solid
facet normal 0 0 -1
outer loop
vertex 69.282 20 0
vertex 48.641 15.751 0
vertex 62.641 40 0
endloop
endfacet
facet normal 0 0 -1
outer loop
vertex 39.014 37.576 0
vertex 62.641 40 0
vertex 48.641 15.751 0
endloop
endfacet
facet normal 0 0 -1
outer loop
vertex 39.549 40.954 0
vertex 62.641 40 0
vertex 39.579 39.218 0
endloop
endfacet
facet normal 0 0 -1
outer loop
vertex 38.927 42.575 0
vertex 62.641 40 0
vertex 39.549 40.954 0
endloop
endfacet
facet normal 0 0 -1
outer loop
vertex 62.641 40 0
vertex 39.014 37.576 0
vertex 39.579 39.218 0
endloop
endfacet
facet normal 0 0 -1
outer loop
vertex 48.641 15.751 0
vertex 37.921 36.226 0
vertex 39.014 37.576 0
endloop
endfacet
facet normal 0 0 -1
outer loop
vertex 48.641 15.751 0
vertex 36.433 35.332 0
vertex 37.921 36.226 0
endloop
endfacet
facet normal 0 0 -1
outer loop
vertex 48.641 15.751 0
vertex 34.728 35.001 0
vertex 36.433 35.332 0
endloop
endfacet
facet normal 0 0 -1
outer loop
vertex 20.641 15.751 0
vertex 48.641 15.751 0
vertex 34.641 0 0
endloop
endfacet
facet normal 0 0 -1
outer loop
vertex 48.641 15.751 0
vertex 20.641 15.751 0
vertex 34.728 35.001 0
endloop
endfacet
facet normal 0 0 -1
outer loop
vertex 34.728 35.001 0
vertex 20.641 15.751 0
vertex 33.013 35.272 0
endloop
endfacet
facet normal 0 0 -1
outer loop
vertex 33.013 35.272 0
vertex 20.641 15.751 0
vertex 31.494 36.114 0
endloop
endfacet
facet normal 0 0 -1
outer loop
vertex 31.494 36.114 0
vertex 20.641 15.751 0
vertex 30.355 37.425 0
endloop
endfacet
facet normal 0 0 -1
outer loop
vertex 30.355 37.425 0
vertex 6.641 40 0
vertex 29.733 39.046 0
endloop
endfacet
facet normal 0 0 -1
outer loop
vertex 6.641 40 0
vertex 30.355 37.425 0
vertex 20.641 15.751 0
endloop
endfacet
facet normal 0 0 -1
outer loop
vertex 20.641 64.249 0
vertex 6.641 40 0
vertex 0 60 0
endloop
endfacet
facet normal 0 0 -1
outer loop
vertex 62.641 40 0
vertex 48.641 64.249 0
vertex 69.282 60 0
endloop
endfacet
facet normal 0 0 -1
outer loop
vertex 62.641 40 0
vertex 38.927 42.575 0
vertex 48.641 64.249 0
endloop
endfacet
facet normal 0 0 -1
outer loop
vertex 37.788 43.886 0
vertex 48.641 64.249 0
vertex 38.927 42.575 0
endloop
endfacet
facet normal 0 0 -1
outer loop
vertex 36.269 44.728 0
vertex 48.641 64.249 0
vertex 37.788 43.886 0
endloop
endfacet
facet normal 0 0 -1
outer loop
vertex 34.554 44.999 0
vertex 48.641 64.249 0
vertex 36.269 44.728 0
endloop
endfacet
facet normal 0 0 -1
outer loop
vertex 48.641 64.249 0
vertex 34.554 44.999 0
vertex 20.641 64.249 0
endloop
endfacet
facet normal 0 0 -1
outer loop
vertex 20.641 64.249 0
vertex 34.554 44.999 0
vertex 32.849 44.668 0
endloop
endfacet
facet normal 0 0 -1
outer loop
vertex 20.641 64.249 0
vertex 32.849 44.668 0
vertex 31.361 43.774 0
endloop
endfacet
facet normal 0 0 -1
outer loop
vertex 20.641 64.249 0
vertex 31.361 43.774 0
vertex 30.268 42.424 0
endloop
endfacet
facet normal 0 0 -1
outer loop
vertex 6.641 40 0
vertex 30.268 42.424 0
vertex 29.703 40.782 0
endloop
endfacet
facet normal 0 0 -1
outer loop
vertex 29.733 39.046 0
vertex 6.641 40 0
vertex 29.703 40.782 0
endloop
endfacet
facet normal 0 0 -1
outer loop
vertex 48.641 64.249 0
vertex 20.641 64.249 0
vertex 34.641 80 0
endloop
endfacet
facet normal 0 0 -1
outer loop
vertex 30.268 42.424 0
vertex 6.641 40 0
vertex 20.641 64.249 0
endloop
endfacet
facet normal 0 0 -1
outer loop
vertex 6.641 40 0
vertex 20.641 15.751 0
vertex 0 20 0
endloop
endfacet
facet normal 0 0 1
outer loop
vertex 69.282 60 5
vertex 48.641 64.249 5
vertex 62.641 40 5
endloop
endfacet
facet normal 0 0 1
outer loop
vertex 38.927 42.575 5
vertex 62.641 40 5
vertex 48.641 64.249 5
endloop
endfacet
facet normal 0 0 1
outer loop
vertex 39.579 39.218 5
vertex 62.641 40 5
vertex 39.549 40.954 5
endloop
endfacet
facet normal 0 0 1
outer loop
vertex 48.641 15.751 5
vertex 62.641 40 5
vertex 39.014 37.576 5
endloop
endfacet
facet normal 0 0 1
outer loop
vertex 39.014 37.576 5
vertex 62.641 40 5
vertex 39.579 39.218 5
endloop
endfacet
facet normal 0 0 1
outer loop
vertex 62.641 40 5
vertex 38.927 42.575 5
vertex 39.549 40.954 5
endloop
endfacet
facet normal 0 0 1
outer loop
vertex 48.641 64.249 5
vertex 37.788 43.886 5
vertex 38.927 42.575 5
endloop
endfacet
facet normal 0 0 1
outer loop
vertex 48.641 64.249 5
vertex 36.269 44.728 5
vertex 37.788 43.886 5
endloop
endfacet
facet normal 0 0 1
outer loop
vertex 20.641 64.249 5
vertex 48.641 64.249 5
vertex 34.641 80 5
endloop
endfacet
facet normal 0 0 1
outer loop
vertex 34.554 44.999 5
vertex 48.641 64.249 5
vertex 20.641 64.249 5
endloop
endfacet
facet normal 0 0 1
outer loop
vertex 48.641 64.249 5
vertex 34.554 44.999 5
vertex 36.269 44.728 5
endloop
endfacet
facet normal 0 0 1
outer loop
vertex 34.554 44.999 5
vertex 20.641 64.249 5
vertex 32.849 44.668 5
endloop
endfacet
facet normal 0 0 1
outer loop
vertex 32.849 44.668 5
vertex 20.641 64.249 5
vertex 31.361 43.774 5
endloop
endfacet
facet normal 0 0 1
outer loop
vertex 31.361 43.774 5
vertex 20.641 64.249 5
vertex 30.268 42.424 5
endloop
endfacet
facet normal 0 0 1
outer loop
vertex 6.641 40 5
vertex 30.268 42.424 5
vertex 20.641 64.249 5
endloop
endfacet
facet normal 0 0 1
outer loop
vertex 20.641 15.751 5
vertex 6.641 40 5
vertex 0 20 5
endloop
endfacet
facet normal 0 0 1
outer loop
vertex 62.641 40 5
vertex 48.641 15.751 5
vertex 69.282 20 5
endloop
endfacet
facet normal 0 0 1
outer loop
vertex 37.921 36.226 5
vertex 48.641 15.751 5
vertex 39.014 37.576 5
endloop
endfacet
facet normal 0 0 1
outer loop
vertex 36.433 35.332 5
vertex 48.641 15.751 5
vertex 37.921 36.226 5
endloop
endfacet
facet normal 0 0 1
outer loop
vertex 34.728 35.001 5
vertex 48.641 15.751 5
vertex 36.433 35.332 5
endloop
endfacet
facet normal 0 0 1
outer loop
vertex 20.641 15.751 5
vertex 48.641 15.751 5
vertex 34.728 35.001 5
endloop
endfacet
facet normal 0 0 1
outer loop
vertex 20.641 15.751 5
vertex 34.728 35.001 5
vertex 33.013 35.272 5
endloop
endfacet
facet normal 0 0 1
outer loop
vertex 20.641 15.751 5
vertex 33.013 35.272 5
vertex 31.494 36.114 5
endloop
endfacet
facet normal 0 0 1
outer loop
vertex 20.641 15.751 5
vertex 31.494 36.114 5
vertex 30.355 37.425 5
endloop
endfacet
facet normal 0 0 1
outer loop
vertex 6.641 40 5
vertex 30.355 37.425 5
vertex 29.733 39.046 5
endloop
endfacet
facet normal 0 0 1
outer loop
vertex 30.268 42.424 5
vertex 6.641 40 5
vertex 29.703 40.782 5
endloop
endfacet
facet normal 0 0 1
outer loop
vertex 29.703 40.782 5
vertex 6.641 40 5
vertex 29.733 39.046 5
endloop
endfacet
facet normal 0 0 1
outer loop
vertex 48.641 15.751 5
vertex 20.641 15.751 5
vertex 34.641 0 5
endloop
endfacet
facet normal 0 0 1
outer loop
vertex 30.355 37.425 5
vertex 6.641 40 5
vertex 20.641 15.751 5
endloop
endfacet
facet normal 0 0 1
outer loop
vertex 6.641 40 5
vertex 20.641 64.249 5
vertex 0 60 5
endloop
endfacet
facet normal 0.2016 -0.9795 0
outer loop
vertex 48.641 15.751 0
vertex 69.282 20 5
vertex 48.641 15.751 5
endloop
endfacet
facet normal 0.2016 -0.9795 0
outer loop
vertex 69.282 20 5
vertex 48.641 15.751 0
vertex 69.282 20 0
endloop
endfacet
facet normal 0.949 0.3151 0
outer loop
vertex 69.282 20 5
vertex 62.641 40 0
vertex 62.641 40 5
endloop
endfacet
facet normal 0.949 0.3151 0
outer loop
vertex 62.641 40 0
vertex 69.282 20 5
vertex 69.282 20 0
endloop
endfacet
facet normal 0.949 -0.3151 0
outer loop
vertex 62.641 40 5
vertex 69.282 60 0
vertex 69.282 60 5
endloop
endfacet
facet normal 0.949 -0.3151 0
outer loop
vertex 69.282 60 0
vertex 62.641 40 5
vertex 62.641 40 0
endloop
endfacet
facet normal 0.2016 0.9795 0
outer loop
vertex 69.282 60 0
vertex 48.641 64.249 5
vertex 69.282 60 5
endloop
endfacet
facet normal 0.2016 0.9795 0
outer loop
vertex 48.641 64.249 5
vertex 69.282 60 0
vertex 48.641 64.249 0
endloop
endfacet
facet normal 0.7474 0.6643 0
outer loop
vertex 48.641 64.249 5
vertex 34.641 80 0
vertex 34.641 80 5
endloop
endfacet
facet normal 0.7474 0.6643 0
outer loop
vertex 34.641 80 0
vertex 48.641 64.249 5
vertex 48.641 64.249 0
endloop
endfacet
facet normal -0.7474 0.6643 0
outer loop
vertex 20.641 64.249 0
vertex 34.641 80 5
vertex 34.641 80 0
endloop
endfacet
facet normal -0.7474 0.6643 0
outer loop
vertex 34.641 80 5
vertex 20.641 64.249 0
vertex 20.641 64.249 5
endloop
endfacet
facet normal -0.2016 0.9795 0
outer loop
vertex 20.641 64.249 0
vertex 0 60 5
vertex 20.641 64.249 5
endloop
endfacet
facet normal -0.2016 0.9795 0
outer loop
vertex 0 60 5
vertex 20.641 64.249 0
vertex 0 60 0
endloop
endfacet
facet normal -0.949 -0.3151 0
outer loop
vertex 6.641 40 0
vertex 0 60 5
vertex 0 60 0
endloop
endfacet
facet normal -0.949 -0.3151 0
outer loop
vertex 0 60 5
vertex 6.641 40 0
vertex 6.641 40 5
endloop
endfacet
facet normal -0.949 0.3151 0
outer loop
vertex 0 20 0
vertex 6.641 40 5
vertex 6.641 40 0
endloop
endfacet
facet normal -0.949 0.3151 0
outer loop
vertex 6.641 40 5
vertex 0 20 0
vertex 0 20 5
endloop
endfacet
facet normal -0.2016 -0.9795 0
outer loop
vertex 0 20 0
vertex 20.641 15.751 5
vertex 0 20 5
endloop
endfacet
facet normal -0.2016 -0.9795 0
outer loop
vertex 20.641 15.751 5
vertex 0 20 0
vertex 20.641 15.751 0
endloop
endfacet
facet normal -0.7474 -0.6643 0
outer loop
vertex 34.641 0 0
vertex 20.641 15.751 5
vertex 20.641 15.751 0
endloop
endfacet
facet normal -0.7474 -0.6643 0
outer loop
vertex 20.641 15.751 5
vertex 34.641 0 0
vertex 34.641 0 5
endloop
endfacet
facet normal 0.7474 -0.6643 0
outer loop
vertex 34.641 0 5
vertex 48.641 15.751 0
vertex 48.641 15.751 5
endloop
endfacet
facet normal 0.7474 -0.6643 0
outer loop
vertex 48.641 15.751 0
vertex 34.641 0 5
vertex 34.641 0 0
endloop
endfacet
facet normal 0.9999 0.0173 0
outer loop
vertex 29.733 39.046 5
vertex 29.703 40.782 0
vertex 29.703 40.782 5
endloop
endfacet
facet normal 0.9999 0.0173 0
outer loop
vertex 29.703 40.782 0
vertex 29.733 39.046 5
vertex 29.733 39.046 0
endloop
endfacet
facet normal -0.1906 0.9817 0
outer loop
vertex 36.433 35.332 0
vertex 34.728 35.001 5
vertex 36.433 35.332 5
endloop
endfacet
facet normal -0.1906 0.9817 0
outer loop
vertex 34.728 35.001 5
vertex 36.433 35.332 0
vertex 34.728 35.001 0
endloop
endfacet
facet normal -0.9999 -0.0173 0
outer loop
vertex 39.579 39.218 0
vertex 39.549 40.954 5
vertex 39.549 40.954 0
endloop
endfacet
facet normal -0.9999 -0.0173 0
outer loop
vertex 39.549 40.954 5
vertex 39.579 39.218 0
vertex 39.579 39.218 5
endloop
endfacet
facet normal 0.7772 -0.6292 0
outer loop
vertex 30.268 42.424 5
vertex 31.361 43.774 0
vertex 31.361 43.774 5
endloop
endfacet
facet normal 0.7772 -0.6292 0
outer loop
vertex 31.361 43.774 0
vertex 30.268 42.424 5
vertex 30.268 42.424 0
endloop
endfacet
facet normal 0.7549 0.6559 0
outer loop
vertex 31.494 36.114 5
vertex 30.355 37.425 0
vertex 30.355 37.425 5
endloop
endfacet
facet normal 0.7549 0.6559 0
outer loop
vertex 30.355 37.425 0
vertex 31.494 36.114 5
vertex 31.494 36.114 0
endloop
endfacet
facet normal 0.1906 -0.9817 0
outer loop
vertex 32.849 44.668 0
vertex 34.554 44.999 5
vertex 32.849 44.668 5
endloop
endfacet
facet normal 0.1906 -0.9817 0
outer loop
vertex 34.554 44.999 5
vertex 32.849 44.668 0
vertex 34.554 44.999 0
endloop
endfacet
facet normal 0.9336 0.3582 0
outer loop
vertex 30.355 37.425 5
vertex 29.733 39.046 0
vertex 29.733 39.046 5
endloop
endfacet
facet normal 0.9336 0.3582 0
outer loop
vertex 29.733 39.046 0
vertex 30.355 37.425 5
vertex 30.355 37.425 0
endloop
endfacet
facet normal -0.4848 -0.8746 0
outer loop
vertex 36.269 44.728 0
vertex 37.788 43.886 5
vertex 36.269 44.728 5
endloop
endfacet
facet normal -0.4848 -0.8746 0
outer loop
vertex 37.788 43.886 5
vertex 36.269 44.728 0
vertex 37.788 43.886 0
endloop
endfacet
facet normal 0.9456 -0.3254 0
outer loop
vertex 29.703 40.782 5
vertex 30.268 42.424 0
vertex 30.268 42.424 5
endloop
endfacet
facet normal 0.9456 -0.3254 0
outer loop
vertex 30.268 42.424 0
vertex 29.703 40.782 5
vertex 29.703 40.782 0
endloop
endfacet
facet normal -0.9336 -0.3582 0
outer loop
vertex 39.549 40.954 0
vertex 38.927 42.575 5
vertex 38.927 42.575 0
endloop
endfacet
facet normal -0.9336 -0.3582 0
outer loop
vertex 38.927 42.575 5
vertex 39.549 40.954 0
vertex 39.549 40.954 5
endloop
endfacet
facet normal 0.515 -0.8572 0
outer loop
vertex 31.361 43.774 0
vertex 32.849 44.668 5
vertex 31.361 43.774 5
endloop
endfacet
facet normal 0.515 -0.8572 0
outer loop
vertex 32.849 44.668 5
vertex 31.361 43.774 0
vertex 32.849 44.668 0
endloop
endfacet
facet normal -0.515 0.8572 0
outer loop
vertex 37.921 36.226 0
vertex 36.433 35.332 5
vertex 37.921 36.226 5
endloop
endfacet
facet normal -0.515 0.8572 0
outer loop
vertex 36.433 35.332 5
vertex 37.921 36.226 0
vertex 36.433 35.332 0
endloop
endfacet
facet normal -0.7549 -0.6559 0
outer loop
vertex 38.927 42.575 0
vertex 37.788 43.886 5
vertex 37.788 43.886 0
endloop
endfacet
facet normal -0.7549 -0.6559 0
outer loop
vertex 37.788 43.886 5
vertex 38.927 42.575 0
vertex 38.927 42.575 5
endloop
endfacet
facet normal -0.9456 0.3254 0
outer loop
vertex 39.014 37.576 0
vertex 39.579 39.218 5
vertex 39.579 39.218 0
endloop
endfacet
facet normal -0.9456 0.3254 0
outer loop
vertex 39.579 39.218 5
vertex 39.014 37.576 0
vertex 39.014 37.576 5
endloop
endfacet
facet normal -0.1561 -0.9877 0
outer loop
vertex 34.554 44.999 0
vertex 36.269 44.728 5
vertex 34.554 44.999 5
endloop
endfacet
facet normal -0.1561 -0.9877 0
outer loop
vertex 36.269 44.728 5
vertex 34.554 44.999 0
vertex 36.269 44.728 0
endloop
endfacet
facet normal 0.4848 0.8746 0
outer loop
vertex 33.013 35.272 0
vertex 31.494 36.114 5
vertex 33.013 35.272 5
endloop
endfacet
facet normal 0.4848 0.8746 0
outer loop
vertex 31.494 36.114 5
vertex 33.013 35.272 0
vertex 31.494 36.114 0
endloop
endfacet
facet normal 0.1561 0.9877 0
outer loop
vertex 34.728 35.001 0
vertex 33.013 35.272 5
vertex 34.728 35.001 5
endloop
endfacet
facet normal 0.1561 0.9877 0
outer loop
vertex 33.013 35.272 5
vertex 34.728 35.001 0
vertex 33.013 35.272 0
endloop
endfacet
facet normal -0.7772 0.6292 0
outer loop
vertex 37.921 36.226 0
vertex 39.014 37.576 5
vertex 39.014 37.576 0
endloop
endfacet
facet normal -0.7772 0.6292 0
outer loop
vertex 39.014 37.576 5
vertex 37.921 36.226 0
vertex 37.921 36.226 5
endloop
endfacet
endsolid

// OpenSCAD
$fn = 32;

// ----------------------------------------------------------------------
// Star wheel: 6-point blunt, R40
// ----------------------------------------------------------------------

// --- parameters (mm) ---
n_points = 6;             // number of points / teeth
r_out = 40;               // tip radius
r_in = 28;                // root radius
bore_r = 5;               // centre bore radius
plate_t = 5;              // plate thickness, Z (extrusion height)
bore_d = 10;              // centre bore diameter

profile = [[34.641, 80], [20.641, 64.249], [0, 60], [6.641, 40], [0, 20], [20.641, 15.751], [34.641, 0], [48.641, 15.751], [69.282, 20], [62.641, 40], [69.282, 60], [48.641, 64.249]];  // primary outline, 12 points, counter clockwise
void_1 = [[39.549, 40.954], [38.927, 42.575], [37.788, 43.886], [36.269, 44.728], [34.554, 44.999], [32.849, 44.668], [31.361, 43.774], [30.268, 42.424], [29.703, 40.782], [29.733, 39.046], [30.355, 37.425], [31.494, 36.114], [33.013, 35.272], [34.728, 35.001], [36.433, 35.332], [37.921, 36.226], [39.014, 37.576], [39.579, 39.218]];  // centre bore, 18 points

// --- the one profile operation ---
difference() {
  linear_extrude(height = plate_t) polygon(points = profile);
  translate([0, 0, -1])
    linear_extrude(height = plate_t + 2) polygon(points = void_1);
}
